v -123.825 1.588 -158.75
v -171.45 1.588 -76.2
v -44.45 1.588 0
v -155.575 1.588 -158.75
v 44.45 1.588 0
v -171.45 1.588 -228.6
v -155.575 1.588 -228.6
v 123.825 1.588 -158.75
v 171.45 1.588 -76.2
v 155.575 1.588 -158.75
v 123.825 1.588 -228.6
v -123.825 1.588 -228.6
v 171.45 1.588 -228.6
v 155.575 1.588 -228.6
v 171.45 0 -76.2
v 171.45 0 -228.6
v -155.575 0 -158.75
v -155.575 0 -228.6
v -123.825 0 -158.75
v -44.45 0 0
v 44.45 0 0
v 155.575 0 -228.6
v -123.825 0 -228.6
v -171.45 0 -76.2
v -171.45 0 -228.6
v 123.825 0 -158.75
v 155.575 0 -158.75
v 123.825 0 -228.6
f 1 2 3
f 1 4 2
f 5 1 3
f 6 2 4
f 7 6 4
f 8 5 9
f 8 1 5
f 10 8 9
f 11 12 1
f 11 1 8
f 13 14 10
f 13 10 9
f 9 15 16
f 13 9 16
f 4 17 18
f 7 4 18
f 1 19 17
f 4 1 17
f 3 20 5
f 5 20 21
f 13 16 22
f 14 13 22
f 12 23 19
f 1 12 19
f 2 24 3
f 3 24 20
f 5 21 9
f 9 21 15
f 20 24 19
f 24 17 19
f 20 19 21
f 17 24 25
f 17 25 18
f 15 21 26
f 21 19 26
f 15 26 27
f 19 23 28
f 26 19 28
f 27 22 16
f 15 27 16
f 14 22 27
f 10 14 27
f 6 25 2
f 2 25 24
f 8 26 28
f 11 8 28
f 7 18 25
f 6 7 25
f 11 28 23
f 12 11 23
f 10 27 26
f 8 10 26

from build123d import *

# Parameters (mm, degrees)
BOSS_EXTRUDE2_DEPTH = 1.5875


with BuildPart() as part:
    # Sketch1 → Boss-Extrude2 (new body)
    with BuildSketch(Plane(origin=(0, 0, 0), x_dir=(1, 0, 0), z_dir=(0, 1, 0))):
        Polygon((-171.45, 76.2), (-44.45, 0), (0, 0), (0, 228.6), (-123.825, 228.6), (-123.825, 158.75), (-155.575, 158.75), (-155.575, 228.6), (-171.45, 228.6), align=None)
        Polygon((0, 228.6), (0, 0), (44.45, 0), (171.45, 76.2), (171.45, 228.6), (155.575, 228.6), (155.575, 158.75), (123.825, 158.75), (123.825, 228.6), align=None)
    extrude(amount=BOSS_EXTRUDE2_DEPTH)


solid = part.part
